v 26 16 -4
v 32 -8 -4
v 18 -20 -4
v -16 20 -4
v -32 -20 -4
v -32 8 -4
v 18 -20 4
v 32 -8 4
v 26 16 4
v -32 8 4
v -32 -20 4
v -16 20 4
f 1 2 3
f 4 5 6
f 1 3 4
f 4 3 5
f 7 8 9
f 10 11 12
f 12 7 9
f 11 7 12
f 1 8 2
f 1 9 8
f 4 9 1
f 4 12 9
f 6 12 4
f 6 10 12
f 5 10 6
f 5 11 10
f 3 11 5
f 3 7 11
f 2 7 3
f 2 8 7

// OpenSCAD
// Starter irregular base for task-001.
$fn = 64;

base_points = [
  [-32, -20],
  [18, -20],
  [32, -8],
  [26, 16],
  [-16, 20],
  [-32, 8]
];

x_scale = 1.00;
y_scale = 1.00;
total_height = 8.00;
top_chamfer = 0.00;
top_scale = 1.00;

module irregular_base() {
  translate([0, 0, -total_height / 2]) {
    if (top_chamfer <= 0) {
      linear_extrude(height = total_height)
        scale([x_scale, y_scale])
          polygon(base_points);
    } else {
      linear_extrude(height = total_height - top_chamfer)
        scale([x_scale, y_scale])
          polygon(base_points);

      translate([0, 0, total_height - top_chamfer])
        linear_extrude(height = top_chamfer, scale = top_scale)
          scale([x_scale, y_scale])
            polygon(base_points);
    }
  }
}

irregular_base();
